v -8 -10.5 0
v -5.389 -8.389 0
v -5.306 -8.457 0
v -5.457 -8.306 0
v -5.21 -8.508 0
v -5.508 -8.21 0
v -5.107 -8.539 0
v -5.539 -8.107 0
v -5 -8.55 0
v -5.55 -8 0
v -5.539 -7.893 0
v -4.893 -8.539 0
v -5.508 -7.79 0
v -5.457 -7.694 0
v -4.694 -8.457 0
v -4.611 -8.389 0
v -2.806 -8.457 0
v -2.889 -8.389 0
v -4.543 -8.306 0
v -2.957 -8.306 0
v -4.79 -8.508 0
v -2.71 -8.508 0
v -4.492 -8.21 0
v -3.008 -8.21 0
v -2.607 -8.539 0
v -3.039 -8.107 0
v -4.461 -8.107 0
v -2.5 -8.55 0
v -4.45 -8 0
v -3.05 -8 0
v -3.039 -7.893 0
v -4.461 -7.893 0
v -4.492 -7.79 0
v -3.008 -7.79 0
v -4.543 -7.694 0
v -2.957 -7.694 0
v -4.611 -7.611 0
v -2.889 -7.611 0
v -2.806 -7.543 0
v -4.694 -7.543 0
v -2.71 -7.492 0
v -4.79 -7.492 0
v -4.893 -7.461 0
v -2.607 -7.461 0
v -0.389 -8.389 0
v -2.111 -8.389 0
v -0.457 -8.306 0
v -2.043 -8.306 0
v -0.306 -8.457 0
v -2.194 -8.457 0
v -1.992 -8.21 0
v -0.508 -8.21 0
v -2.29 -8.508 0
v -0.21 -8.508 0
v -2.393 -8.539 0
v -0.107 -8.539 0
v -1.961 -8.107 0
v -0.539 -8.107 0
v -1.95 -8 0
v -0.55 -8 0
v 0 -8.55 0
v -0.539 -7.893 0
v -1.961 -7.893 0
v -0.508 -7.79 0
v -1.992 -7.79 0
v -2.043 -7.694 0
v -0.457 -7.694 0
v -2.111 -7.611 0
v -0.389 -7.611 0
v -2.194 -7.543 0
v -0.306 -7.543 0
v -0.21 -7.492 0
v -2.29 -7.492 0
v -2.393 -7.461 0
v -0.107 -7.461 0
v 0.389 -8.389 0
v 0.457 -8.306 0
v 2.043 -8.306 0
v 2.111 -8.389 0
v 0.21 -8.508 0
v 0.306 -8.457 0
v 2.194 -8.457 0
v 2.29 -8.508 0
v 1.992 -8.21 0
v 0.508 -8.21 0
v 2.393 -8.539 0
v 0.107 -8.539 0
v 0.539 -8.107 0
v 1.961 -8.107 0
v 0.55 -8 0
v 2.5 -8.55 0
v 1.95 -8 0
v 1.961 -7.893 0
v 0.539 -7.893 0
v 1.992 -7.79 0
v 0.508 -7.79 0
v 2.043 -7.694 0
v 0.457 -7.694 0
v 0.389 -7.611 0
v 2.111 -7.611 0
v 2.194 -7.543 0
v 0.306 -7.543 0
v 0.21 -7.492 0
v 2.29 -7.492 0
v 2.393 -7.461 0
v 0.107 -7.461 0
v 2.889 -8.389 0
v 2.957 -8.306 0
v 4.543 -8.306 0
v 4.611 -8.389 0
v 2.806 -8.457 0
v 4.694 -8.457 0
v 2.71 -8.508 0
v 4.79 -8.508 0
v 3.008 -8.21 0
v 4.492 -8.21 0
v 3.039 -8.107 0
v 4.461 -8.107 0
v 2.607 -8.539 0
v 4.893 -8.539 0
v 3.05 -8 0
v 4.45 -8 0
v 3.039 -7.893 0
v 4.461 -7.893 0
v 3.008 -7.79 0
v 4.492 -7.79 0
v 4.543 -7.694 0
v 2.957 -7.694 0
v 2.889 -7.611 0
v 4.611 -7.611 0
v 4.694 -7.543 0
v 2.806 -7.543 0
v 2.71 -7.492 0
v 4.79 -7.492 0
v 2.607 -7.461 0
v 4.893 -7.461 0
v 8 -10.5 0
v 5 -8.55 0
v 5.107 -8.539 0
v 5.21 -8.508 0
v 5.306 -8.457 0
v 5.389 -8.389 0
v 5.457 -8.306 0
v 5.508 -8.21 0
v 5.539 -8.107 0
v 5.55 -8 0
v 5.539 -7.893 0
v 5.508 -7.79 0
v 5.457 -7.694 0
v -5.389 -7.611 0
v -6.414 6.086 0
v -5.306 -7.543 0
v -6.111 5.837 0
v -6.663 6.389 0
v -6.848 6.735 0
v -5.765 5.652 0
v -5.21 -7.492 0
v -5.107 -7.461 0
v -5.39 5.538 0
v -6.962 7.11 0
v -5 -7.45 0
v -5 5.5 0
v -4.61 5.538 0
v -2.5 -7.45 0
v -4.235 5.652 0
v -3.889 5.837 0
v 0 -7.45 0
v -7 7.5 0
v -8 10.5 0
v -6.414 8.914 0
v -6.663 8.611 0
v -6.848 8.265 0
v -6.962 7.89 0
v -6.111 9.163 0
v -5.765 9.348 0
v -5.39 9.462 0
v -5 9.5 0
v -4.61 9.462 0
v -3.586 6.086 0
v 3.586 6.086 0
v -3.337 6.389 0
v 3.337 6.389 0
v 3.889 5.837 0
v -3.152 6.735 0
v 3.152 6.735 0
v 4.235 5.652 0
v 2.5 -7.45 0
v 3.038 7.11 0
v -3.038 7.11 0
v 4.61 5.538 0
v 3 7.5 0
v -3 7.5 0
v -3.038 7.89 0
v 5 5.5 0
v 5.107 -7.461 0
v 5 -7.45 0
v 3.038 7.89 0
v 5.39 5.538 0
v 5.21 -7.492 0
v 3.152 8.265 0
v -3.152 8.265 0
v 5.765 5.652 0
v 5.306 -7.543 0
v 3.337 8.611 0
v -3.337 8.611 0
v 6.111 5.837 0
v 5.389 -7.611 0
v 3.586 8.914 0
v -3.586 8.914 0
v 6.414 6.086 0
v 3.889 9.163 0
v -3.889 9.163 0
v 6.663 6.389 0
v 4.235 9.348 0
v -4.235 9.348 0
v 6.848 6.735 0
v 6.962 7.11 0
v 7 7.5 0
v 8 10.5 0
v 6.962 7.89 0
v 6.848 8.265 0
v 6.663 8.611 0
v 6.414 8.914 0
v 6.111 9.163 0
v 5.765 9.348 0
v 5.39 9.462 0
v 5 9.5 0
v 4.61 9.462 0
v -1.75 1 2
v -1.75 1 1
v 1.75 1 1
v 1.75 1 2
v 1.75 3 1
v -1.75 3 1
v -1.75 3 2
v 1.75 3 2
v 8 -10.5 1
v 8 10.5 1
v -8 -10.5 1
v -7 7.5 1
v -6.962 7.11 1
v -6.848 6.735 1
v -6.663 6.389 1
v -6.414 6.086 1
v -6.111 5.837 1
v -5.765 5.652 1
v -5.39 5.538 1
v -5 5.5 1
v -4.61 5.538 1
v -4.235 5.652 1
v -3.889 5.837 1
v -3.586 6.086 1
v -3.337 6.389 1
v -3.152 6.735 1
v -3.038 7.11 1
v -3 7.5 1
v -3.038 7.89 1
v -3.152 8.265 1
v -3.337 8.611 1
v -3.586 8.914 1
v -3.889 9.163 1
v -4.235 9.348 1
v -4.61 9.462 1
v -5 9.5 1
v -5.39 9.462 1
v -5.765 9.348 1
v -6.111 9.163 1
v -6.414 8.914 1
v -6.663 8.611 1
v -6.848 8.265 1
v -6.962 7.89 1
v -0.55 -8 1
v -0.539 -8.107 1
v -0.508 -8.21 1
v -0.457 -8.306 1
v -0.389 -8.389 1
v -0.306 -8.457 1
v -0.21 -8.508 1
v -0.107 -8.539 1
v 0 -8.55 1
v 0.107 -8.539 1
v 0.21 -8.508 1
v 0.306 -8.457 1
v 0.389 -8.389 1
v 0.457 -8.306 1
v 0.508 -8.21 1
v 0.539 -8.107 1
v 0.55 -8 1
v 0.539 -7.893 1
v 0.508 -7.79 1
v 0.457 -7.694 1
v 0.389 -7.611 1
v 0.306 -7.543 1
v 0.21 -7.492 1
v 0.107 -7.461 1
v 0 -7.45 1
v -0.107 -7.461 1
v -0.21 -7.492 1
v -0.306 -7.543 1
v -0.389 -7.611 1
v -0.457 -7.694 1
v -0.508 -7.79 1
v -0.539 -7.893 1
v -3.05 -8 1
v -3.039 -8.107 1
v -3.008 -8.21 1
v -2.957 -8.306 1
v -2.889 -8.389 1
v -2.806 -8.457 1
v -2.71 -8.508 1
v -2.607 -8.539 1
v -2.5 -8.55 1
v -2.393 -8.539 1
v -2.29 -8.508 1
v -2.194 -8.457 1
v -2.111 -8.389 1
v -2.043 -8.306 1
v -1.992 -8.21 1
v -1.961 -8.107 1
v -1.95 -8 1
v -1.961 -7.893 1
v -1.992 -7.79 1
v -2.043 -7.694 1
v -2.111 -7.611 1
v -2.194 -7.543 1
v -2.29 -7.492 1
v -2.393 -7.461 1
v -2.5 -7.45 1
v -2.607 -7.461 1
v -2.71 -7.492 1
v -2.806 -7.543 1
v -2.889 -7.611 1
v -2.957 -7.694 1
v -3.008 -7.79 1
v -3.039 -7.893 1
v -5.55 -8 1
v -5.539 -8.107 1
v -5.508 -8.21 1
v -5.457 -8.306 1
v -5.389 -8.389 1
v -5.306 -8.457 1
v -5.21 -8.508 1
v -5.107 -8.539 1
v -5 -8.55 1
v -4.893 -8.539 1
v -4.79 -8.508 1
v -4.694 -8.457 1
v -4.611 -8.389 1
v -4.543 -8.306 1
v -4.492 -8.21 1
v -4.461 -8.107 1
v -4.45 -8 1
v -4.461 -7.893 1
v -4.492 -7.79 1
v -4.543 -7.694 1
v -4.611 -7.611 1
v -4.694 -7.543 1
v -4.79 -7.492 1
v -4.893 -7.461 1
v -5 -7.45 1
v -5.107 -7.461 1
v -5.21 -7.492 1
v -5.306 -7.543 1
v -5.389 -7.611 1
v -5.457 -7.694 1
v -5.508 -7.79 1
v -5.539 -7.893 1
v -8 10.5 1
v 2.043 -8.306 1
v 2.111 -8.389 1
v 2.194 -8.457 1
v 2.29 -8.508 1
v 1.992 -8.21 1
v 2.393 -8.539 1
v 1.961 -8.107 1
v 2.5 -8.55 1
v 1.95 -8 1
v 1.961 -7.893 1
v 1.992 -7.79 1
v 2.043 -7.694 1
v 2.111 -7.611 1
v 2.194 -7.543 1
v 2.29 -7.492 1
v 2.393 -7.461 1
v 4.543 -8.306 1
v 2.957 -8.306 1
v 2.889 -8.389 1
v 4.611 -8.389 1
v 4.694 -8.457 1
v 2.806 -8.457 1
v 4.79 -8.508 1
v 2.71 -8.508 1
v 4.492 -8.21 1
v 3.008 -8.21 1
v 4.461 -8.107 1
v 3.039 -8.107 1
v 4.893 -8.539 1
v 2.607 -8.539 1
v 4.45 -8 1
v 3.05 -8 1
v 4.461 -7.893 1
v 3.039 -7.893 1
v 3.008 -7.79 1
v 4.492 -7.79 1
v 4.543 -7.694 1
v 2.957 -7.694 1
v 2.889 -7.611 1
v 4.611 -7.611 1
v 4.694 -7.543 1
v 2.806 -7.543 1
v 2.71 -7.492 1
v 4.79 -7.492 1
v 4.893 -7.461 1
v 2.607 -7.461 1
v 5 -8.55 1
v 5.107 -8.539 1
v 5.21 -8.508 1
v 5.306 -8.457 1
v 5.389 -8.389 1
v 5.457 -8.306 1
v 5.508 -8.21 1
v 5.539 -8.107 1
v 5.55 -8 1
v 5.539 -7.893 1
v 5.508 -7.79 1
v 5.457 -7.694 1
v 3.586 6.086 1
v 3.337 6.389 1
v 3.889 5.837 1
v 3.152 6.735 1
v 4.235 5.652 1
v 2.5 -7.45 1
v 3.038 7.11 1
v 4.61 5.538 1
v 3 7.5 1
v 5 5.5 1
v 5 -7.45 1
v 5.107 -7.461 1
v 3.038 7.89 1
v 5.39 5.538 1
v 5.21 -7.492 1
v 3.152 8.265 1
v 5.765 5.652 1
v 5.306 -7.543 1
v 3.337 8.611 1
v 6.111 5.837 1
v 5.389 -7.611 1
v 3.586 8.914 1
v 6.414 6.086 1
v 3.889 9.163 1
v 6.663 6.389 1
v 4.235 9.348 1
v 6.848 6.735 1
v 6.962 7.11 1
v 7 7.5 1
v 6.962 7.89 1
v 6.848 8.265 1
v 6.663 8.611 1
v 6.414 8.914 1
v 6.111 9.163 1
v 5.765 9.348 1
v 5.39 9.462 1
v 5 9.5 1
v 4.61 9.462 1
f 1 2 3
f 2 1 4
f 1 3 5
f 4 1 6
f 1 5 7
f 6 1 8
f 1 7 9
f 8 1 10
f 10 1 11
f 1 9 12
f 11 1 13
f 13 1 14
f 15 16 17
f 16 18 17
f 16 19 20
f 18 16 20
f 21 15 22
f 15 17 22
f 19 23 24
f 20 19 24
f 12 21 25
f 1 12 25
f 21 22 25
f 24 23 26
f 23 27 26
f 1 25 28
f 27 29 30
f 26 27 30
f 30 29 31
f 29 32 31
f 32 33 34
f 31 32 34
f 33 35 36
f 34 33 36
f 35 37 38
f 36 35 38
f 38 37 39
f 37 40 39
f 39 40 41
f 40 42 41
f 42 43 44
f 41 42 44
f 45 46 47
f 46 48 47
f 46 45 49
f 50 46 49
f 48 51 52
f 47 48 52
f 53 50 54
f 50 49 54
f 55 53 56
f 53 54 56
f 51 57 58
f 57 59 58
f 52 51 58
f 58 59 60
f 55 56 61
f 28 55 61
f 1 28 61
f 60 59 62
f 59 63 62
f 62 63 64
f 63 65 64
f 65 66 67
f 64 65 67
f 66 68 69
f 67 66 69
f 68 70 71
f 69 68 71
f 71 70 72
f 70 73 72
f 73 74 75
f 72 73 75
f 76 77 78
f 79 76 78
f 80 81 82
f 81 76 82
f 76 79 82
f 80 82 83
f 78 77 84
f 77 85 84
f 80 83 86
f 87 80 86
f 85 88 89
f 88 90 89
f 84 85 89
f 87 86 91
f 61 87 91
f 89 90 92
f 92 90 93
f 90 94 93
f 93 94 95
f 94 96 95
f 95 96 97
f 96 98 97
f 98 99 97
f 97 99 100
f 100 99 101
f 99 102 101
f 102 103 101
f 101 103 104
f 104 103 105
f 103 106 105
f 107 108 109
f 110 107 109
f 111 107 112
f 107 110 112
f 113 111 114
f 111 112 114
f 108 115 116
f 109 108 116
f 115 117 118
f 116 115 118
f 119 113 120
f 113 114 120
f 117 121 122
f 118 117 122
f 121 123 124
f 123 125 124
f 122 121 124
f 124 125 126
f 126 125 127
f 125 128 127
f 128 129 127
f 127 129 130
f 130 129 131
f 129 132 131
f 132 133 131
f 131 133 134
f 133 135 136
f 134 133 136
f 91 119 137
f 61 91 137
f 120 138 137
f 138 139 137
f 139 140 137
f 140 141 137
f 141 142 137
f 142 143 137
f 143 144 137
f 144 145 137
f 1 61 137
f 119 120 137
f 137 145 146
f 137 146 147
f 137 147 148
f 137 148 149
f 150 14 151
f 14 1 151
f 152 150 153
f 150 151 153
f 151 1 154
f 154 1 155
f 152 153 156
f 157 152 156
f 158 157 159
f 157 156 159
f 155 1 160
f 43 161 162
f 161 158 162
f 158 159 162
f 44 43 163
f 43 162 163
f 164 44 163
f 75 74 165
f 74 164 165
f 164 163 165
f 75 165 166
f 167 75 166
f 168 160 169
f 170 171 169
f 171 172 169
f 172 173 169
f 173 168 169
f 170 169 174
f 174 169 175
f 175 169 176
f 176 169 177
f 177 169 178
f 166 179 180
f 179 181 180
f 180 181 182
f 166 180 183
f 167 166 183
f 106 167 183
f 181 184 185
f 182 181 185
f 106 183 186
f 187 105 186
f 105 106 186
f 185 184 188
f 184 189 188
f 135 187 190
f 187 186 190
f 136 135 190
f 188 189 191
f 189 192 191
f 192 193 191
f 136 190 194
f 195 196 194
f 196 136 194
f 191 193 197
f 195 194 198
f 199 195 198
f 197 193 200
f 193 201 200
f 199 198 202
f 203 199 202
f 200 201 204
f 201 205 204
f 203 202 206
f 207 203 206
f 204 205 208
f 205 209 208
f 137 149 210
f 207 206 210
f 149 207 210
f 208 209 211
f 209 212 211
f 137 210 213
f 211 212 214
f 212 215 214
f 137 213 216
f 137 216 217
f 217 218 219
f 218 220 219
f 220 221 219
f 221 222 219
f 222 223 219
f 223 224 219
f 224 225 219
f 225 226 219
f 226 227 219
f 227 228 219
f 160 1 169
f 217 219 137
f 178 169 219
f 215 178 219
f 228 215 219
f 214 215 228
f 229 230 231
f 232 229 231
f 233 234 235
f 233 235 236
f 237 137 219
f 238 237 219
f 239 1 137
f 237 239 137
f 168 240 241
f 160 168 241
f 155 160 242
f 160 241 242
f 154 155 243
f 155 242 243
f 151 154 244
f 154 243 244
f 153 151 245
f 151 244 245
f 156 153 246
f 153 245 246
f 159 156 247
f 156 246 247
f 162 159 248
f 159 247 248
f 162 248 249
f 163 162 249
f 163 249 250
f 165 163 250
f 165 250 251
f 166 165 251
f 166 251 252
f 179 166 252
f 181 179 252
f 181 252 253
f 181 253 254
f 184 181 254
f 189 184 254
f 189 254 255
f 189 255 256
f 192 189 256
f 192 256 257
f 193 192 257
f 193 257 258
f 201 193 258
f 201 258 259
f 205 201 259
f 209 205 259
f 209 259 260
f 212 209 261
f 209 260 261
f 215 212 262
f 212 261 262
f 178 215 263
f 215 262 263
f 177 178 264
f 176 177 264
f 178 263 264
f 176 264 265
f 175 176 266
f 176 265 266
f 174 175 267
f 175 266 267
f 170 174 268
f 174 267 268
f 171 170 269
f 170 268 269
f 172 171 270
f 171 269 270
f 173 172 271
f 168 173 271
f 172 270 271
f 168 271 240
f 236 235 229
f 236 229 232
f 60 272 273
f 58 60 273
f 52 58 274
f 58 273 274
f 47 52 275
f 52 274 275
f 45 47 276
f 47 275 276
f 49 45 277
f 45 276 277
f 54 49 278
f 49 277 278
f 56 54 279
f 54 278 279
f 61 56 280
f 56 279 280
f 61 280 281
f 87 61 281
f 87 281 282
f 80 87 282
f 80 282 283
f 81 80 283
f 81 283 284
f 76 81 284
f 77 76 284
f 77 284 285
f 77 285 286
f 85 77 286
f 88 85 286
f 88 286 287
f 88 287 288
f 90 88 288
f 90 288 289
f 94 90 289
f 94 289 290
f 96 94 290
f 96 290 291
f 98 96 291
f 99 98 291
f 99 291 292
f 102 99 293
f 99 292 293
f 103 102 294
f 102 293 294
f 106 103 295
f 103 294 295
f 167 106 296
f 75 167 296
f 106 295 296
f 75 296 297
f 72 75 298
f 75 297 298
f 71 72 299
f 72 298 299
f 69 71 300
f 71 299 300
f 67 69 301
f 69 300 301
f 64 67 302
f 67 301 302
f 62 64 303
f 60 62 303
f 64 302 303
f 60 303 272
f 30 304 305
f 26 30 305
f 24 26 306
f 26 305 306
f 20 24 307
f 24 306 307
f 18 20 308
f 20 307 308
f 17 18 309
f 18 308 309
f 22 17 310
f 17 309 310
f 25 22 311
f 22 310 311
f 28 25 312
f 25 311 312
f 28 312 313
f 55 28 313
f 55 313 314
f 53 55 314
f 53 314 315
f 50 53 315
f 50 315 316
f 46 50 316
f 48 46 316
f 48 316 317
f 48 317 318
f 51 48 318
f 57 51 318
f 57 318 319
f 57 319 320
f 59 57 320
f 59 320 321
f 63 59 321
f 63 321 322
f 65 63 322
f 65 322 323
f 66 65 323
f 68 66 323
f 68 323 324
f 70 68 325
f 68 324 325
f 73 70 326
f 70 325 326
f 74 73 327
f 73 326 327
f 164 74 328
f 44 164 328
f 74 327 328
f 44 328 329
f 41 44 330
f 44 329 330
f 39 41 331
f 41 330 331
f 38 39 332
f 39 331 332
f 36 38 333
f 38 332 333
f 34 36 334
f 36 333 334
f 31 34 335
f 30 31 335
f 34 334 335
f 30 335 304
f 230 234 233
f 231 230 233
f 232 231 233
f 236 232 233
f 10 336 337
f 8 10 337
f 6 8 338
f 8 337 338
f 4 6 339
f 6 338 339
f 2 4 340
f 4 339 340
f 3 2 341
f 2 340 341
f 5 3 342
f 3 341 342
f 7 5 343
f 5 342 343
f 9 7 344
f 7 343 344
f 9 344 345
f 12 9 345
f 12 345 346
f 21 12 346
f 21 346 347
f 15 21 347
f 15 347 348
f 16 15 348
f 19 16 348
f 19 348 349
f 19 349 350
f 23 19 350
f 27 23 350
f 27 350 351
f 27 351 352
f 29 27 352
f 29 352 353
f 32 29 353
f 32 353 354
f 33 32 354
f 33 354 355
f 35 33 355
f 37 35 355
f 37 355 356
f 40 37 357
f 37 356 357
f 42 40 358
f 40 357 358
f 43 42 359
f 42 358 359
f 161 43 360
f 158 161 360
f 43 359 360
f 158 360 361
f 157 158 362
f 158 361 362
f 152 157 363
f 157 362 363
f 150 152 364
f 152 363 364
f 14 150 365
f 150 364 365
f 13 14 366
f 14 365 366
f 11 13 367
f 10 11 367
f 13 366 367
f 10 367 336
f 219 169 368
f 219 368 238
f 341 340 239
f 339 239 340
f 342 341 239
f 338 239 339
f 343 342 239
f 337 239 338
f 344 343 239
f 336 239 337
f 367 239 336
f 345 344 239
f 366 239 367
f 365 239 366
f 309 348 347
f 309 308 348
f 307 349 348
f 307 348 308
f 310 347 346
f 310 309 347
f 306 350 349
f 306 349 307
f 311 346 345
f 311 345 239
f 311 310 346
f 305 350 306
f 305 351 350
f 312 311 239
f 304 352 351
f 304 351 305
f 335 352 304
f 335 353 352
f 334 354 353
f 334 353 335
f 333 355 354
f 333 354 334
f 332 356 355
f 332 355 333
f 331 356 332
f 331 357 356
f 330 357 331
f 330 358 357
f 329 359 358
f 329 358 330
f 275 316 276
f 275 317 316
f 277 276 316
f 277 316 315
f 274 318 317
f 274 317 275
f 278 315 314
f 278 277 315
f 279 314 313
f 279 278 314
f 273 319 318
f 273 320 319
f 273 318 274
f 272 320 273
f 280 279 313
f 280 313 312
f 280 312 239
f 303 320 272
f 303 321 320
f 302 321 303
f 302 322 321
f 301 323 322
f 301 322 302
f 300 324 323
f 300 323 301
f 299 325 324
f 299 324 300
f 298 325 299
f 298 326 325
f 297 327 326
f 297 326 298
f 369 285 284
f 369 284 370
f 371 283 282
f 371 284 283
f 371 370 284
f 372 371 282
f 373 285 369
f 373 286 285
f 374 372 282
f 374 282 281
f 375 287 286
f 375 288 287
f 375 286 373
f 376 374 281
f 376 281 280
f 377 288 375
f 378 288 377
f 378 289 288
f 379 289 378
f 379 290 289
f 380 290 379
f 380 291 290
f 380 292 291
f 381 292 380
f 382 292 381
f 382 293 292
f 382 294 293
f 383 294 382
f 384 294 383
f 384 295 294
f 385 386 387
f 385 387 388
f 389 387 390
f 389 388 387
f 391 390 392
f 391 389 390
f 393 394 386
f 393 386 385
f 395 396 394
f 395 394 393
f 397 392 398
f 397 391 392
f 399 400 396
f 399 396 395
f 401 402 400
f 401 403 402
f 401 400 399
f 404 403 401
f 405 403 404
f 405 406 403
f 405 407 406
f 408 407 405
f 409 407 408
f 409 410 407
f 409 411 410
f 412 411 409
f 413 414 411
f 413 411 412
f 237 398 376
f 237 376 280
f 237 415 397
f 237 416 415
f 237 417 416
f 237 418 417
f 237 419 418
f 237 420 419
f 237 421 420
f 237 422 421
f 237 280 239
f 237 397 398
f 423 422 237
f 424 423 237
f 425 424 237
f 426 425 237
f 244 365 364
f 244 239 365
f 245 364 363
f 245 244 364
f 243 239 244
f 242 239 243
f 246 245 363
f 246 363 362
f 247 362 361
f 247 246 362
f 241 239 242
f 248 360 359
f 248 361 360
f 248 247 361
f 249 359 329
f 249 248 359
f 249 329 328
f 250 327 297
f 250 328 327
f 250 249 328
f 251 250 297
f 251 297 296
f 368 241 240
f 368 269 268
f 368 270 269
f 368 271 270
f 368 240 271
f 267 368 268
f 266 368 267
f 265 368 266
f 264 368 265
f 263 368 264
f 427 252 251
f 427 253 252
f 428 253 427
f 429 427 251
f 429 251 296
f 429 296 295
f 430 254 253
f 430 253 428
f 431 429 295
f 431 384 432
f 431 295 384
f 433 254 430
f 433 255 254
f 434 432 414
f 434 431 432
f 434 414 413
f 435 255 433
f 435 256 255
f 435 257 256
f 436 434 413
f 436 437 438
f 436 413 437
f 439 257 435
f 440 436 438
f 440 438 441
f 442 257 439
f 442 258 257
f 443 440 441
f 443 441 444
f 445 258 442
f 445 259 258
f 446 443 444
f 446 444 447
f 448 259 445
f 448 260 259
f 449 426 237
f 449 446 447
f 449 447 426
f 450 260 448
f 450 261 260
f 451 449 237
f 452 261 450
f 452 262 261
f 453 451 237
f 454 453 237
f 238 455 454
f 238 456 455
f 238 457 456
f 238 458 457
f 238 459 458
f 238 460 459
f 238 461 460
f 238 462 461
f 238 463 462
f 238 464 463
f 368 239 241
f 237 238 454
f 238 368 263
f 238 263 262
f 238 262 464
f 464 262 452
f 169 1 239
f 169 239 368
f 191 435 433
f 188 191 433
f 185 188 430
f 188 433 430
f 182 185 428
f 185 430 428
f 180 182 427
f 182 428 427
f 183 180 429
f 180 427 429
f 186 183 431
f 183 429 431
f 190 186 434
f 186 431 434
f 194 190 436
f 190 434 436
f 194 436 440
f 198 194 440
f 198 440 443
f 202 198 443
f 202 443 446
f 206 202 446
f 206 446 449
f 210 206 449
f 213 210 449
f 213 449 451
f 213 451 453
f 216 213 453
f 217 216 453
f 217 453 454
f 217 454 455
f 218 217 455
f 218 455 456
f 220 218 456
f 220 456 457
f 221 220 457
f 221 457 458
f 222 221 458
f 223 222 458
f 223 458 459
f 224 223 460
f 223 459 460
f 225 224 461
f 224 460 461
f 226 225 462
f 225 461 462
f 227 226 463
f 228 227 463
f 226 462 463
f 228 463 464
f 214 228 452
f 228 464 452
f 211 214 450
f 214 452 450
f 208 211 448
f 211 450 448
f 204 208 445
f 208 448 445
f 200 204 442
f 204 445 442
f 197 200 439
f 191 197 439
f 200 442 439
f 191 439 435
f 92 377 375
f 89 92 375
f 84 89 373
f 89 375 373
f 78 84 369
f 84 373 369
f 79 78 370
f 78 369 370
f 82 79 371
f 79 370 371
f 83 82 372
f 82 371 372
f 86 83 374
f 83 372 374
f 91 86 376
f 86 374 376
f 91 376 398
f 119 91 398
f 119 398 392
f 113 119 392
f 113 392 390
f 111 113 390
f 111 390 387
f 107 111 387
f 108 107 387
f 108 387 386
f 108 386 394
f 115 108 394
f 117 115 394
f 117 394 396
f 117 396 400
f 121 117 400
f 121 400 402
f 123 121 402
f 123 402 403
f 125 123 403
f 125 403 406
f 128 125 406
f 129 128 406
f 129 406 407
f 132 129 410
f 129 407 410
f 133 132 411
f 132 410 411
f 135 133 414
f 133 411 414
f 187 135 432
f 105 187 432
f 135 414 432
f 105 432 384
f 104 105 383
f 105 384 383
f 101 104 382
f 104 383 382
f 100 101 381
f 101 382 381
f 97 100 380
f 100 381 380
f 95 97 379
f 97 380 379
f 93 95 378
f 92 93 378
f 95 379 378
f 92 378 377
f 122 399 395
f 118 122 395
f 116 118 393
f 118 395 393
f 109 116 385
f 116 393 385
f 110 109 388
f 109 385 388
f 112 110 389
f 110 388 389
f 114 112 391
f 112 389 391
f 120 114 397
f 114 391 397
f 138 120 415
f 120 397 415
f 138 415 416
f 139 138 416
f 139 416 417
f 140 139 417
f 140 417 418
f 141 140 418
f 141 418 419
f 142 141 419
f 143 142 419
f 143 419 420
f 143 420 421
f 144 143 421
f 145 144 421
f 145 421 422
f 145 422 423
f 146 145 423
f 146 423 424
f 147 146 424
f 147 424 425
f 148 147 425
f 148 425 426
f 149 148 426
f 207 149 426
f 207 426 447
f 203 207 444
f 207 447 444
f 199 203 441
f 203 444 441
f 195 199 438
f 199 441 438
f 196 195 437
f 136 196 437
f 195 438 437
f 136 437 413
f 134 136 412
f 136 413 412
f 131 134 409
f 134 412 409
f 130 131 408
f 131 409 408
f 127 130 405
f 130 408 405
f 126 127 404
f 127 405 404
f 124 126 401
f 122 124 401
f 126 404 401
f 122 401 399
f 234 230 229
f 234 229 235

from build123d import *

# Parameters (mm, degrees)
F0_W     = 16
F0_H     = 21
F1_DEPTH = 1
F2_D     = 1.1
F3_D     = 4
F4_W     = 3.5
F4_H     = 2
F5_DEPTH = 1


with BuildPart() as f1:
    # F0 (on Top) → F1 (new body)
    with BuildSketch(Plane.XY):
        Rectangle(F0_W, F0_H)
    extrude(amount=F1_DEPTH)

    # F2 (through all)
    with Locations(Plane(origin=(0, 0, 0), x_dir=(1, 0, 0), z_dir=(0, 0, -1))):
        with Locations((-5, 8), (-2.5, 8), (0, 8), (2.5, 8), (5, 8)):
            Hole(F2_D / 2)

    # F3 (through all)
    with Locations(Plane(origin=(0, 0, 0), x_dir=(1, 0, 0), z_dir=(0, 0, -1))):
        with Locations((-5, -7.5), (5, -7.5)):
            Hole(F3_D / 2)


with BuildPart() as f5:
    # F4 (on face) → F5 (new body)
    with BuildSketch(Plane.XY.offset(1)):
        with Locations((0, 2)):
            Rectangle(F4_W, F4_H)
    extrude(amount=F5_DEPTH)


solid = Compound([f1.part, f5.part])
